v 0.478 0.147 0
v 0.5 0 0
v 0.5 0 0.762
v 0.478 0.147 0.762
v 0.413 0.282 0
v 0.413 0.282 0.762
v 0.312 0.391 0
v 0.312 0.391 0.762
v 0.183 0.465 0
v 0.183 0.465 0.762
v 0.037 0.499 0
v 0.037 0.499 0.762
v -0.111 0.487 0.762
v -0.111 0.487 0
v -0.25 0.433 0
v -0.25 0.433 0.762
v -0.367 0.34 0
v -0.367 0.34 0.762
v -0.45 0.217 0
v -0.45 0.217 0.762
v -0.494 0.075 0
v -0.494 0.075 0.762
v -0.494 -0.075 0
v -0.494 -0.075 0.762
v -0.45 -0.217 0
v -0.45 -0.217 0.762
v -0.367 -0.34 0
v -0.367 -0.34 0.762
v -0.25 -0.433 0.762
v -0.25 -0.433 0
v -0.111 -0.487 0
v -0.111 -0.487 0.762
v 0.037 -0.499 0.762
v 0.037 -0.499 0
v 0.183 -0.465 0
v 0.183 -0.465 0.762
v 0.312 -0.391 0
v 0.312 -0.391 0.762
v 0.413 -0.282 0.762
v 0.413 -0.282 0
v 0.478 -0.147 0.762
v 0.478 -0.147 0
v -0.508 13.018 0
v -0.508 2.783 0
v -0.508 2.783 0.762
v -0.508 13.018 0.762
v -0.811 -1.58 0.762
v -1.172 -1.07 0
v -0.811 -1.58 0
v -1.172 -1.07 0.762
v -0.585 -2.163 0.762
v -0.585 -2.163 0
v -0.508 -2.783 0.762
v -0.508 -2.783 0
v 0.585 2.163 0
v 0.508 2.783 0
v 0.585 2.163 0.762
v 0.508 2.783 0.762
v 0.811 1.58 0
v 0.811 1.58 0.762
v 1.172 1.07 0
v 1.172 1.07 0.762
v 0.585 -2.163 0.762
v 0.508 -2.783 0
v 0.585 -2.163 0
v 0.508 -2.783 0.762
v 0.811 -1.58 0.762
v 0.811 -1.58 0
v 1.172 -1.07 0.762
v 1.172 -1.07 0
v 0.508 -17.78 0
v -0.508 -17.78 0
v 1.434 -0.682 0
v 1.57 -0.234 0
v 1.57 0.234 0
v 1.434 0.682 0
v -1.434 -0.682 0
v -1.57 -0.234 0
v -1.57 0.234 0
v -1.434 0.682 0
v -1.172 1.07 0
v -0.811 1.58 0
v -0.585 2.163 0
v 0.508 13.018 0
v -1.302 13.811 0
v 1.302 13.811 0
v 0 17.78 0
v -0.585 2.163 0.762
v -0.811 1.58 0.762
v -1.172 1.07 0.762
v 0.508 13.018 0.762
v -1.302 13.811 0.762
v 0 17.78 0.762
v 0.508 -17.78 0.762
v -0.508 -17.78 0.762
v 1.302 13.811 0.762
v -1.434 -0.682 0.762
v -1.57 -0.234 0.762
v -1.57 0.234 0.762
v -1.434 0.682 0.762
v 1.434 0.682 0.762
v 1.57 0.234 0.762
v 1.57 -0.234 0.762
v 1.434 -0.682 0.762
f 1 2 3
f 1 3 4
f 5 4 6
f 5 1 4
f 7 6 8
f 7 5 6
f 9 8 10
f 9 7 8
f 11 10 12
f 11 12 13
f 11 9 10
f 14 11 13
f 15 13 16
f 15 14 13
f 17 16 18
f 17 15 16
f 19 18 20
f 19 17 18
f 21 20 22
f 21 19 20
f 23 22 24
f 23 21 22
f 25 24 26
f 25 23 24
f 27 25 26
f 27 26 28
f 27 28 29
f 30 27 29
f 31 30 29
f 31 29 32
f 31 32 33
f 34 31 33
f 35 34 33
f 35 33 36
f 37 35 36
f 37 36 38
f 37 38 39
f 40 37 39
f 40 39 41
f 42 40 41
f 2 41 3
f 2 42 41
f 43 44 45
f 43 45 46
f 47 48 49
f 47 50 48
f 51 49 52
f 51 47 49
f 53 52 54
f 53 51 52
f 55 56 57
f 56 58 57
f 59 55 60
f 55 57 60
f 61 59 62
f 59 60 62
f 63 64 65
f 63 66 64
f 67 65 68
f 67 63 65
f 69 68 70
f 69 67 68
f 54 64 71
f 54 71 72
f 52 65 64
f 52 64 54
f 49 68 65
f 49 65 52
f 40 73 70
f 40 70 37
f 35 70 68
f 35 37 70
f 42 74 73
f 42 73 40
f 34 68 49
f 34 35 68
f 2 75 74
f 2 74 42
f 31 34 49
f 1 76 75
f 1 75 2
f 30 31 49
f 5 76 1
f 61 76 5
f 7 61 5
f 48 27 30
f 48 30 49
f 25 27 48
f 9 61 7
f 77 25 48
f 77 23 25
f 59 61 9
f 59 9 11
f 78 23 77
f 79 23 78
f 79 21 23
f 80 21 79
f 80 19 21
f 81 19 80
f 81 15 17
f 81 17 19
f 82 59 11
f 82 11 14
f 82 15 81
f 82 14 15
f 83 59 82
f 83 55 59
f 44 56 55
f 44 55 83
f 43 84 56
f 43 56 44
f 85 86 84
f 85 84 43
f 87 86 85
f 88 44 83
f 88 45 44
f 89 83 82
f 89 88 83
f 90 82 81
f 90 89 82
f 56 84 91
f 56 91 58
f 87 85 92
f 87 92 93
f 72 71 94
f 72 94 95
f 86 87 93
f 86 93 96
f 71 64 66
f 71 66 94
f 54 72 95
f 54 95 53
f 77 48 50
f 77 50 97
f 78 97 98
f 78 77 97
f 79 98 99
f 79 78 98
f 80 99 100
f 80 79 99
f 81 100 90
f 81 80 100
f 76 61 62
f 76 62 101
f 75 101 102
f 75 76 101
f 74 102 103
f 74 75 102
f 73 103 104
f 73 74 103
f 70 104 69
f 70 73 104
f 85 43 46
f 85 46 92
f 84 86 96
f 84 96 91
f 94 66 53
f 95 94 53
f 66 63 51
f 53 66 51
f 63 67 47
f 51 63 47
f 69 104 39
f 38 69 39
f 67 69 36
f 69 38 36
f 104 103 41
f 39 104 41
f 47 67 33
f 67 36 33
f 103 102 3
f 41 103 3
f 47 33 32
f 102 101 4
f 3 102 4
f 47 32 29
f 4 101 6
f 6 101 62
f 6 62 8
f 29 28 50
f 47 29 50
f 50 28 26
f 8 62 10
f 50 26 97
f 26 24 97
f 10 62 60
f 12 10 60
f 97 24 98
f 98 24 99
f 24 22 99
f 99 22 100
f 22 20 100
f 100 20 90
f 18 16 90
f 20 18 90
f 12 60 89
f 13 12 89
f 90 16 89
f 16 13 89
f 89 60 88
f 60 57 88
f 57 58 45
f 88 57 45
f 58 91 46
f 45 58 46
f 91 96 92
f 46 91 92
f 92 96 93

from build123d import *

# Parameters (mm, degrees)
SKETCH1_R           = 0.5
BOSS_EXTRUDE1_DEPTH = 0.762
FILLET1_R           = 2.54


with BuildPart() as part:
    # Sketch1 → Boss-Extrude1 (new body)
    with BuildSketch(Plane.XY):
        with BuildLine():
            Line((-0.508, 13.0175), (-1.30175, 13.81125))
            Line((-1.30175, 13.81125), (0, 17.78))
            Line((0, 17.78), (1.30175, 13.81125))
            Line((1.30175, 13.81125), (0.508, 13.0175))
            Line((0.508, 13.0175), (0.508, 1.504025349))
            ThreePointArc((0.508, 1.504025349), (1.5875, 0), (0.508, -1.504025349))
            Line((0.508, -1.504025349), (0.508, -17.78))
            Line((0.508, -17.78), (-0.508, -17.78))
            Line((-0.508, -17.78), (-0.508, -1.504025349))
            ThreePointArc((-0.508, -1.504025349), (-1.5875, 0), (-0.508, 1.504025349))
            Line((-0.508, 1.504025349), (-0.508, 13.0175))
        make_face()
        Circle(SKETCH1_R, mode=Mode.SUBTRACT)
    extrude(amount=BOSS_EXTRUDE1_DEPTH)

    # Fillet1
    fillet1_edges = [part.edges().sort_by_distance(p)[0] for p in [
        (0.508, -1.504025349, 0.381),
        (-0.508, -1.504025349, 0.381),
        (-0.508, 1.504025349, 0.381),
        (0.508, 1.504025349, 0.381),
    ]]
    fillet(fillet1_edges, radius=FILLET1_R)


solid = part.part
